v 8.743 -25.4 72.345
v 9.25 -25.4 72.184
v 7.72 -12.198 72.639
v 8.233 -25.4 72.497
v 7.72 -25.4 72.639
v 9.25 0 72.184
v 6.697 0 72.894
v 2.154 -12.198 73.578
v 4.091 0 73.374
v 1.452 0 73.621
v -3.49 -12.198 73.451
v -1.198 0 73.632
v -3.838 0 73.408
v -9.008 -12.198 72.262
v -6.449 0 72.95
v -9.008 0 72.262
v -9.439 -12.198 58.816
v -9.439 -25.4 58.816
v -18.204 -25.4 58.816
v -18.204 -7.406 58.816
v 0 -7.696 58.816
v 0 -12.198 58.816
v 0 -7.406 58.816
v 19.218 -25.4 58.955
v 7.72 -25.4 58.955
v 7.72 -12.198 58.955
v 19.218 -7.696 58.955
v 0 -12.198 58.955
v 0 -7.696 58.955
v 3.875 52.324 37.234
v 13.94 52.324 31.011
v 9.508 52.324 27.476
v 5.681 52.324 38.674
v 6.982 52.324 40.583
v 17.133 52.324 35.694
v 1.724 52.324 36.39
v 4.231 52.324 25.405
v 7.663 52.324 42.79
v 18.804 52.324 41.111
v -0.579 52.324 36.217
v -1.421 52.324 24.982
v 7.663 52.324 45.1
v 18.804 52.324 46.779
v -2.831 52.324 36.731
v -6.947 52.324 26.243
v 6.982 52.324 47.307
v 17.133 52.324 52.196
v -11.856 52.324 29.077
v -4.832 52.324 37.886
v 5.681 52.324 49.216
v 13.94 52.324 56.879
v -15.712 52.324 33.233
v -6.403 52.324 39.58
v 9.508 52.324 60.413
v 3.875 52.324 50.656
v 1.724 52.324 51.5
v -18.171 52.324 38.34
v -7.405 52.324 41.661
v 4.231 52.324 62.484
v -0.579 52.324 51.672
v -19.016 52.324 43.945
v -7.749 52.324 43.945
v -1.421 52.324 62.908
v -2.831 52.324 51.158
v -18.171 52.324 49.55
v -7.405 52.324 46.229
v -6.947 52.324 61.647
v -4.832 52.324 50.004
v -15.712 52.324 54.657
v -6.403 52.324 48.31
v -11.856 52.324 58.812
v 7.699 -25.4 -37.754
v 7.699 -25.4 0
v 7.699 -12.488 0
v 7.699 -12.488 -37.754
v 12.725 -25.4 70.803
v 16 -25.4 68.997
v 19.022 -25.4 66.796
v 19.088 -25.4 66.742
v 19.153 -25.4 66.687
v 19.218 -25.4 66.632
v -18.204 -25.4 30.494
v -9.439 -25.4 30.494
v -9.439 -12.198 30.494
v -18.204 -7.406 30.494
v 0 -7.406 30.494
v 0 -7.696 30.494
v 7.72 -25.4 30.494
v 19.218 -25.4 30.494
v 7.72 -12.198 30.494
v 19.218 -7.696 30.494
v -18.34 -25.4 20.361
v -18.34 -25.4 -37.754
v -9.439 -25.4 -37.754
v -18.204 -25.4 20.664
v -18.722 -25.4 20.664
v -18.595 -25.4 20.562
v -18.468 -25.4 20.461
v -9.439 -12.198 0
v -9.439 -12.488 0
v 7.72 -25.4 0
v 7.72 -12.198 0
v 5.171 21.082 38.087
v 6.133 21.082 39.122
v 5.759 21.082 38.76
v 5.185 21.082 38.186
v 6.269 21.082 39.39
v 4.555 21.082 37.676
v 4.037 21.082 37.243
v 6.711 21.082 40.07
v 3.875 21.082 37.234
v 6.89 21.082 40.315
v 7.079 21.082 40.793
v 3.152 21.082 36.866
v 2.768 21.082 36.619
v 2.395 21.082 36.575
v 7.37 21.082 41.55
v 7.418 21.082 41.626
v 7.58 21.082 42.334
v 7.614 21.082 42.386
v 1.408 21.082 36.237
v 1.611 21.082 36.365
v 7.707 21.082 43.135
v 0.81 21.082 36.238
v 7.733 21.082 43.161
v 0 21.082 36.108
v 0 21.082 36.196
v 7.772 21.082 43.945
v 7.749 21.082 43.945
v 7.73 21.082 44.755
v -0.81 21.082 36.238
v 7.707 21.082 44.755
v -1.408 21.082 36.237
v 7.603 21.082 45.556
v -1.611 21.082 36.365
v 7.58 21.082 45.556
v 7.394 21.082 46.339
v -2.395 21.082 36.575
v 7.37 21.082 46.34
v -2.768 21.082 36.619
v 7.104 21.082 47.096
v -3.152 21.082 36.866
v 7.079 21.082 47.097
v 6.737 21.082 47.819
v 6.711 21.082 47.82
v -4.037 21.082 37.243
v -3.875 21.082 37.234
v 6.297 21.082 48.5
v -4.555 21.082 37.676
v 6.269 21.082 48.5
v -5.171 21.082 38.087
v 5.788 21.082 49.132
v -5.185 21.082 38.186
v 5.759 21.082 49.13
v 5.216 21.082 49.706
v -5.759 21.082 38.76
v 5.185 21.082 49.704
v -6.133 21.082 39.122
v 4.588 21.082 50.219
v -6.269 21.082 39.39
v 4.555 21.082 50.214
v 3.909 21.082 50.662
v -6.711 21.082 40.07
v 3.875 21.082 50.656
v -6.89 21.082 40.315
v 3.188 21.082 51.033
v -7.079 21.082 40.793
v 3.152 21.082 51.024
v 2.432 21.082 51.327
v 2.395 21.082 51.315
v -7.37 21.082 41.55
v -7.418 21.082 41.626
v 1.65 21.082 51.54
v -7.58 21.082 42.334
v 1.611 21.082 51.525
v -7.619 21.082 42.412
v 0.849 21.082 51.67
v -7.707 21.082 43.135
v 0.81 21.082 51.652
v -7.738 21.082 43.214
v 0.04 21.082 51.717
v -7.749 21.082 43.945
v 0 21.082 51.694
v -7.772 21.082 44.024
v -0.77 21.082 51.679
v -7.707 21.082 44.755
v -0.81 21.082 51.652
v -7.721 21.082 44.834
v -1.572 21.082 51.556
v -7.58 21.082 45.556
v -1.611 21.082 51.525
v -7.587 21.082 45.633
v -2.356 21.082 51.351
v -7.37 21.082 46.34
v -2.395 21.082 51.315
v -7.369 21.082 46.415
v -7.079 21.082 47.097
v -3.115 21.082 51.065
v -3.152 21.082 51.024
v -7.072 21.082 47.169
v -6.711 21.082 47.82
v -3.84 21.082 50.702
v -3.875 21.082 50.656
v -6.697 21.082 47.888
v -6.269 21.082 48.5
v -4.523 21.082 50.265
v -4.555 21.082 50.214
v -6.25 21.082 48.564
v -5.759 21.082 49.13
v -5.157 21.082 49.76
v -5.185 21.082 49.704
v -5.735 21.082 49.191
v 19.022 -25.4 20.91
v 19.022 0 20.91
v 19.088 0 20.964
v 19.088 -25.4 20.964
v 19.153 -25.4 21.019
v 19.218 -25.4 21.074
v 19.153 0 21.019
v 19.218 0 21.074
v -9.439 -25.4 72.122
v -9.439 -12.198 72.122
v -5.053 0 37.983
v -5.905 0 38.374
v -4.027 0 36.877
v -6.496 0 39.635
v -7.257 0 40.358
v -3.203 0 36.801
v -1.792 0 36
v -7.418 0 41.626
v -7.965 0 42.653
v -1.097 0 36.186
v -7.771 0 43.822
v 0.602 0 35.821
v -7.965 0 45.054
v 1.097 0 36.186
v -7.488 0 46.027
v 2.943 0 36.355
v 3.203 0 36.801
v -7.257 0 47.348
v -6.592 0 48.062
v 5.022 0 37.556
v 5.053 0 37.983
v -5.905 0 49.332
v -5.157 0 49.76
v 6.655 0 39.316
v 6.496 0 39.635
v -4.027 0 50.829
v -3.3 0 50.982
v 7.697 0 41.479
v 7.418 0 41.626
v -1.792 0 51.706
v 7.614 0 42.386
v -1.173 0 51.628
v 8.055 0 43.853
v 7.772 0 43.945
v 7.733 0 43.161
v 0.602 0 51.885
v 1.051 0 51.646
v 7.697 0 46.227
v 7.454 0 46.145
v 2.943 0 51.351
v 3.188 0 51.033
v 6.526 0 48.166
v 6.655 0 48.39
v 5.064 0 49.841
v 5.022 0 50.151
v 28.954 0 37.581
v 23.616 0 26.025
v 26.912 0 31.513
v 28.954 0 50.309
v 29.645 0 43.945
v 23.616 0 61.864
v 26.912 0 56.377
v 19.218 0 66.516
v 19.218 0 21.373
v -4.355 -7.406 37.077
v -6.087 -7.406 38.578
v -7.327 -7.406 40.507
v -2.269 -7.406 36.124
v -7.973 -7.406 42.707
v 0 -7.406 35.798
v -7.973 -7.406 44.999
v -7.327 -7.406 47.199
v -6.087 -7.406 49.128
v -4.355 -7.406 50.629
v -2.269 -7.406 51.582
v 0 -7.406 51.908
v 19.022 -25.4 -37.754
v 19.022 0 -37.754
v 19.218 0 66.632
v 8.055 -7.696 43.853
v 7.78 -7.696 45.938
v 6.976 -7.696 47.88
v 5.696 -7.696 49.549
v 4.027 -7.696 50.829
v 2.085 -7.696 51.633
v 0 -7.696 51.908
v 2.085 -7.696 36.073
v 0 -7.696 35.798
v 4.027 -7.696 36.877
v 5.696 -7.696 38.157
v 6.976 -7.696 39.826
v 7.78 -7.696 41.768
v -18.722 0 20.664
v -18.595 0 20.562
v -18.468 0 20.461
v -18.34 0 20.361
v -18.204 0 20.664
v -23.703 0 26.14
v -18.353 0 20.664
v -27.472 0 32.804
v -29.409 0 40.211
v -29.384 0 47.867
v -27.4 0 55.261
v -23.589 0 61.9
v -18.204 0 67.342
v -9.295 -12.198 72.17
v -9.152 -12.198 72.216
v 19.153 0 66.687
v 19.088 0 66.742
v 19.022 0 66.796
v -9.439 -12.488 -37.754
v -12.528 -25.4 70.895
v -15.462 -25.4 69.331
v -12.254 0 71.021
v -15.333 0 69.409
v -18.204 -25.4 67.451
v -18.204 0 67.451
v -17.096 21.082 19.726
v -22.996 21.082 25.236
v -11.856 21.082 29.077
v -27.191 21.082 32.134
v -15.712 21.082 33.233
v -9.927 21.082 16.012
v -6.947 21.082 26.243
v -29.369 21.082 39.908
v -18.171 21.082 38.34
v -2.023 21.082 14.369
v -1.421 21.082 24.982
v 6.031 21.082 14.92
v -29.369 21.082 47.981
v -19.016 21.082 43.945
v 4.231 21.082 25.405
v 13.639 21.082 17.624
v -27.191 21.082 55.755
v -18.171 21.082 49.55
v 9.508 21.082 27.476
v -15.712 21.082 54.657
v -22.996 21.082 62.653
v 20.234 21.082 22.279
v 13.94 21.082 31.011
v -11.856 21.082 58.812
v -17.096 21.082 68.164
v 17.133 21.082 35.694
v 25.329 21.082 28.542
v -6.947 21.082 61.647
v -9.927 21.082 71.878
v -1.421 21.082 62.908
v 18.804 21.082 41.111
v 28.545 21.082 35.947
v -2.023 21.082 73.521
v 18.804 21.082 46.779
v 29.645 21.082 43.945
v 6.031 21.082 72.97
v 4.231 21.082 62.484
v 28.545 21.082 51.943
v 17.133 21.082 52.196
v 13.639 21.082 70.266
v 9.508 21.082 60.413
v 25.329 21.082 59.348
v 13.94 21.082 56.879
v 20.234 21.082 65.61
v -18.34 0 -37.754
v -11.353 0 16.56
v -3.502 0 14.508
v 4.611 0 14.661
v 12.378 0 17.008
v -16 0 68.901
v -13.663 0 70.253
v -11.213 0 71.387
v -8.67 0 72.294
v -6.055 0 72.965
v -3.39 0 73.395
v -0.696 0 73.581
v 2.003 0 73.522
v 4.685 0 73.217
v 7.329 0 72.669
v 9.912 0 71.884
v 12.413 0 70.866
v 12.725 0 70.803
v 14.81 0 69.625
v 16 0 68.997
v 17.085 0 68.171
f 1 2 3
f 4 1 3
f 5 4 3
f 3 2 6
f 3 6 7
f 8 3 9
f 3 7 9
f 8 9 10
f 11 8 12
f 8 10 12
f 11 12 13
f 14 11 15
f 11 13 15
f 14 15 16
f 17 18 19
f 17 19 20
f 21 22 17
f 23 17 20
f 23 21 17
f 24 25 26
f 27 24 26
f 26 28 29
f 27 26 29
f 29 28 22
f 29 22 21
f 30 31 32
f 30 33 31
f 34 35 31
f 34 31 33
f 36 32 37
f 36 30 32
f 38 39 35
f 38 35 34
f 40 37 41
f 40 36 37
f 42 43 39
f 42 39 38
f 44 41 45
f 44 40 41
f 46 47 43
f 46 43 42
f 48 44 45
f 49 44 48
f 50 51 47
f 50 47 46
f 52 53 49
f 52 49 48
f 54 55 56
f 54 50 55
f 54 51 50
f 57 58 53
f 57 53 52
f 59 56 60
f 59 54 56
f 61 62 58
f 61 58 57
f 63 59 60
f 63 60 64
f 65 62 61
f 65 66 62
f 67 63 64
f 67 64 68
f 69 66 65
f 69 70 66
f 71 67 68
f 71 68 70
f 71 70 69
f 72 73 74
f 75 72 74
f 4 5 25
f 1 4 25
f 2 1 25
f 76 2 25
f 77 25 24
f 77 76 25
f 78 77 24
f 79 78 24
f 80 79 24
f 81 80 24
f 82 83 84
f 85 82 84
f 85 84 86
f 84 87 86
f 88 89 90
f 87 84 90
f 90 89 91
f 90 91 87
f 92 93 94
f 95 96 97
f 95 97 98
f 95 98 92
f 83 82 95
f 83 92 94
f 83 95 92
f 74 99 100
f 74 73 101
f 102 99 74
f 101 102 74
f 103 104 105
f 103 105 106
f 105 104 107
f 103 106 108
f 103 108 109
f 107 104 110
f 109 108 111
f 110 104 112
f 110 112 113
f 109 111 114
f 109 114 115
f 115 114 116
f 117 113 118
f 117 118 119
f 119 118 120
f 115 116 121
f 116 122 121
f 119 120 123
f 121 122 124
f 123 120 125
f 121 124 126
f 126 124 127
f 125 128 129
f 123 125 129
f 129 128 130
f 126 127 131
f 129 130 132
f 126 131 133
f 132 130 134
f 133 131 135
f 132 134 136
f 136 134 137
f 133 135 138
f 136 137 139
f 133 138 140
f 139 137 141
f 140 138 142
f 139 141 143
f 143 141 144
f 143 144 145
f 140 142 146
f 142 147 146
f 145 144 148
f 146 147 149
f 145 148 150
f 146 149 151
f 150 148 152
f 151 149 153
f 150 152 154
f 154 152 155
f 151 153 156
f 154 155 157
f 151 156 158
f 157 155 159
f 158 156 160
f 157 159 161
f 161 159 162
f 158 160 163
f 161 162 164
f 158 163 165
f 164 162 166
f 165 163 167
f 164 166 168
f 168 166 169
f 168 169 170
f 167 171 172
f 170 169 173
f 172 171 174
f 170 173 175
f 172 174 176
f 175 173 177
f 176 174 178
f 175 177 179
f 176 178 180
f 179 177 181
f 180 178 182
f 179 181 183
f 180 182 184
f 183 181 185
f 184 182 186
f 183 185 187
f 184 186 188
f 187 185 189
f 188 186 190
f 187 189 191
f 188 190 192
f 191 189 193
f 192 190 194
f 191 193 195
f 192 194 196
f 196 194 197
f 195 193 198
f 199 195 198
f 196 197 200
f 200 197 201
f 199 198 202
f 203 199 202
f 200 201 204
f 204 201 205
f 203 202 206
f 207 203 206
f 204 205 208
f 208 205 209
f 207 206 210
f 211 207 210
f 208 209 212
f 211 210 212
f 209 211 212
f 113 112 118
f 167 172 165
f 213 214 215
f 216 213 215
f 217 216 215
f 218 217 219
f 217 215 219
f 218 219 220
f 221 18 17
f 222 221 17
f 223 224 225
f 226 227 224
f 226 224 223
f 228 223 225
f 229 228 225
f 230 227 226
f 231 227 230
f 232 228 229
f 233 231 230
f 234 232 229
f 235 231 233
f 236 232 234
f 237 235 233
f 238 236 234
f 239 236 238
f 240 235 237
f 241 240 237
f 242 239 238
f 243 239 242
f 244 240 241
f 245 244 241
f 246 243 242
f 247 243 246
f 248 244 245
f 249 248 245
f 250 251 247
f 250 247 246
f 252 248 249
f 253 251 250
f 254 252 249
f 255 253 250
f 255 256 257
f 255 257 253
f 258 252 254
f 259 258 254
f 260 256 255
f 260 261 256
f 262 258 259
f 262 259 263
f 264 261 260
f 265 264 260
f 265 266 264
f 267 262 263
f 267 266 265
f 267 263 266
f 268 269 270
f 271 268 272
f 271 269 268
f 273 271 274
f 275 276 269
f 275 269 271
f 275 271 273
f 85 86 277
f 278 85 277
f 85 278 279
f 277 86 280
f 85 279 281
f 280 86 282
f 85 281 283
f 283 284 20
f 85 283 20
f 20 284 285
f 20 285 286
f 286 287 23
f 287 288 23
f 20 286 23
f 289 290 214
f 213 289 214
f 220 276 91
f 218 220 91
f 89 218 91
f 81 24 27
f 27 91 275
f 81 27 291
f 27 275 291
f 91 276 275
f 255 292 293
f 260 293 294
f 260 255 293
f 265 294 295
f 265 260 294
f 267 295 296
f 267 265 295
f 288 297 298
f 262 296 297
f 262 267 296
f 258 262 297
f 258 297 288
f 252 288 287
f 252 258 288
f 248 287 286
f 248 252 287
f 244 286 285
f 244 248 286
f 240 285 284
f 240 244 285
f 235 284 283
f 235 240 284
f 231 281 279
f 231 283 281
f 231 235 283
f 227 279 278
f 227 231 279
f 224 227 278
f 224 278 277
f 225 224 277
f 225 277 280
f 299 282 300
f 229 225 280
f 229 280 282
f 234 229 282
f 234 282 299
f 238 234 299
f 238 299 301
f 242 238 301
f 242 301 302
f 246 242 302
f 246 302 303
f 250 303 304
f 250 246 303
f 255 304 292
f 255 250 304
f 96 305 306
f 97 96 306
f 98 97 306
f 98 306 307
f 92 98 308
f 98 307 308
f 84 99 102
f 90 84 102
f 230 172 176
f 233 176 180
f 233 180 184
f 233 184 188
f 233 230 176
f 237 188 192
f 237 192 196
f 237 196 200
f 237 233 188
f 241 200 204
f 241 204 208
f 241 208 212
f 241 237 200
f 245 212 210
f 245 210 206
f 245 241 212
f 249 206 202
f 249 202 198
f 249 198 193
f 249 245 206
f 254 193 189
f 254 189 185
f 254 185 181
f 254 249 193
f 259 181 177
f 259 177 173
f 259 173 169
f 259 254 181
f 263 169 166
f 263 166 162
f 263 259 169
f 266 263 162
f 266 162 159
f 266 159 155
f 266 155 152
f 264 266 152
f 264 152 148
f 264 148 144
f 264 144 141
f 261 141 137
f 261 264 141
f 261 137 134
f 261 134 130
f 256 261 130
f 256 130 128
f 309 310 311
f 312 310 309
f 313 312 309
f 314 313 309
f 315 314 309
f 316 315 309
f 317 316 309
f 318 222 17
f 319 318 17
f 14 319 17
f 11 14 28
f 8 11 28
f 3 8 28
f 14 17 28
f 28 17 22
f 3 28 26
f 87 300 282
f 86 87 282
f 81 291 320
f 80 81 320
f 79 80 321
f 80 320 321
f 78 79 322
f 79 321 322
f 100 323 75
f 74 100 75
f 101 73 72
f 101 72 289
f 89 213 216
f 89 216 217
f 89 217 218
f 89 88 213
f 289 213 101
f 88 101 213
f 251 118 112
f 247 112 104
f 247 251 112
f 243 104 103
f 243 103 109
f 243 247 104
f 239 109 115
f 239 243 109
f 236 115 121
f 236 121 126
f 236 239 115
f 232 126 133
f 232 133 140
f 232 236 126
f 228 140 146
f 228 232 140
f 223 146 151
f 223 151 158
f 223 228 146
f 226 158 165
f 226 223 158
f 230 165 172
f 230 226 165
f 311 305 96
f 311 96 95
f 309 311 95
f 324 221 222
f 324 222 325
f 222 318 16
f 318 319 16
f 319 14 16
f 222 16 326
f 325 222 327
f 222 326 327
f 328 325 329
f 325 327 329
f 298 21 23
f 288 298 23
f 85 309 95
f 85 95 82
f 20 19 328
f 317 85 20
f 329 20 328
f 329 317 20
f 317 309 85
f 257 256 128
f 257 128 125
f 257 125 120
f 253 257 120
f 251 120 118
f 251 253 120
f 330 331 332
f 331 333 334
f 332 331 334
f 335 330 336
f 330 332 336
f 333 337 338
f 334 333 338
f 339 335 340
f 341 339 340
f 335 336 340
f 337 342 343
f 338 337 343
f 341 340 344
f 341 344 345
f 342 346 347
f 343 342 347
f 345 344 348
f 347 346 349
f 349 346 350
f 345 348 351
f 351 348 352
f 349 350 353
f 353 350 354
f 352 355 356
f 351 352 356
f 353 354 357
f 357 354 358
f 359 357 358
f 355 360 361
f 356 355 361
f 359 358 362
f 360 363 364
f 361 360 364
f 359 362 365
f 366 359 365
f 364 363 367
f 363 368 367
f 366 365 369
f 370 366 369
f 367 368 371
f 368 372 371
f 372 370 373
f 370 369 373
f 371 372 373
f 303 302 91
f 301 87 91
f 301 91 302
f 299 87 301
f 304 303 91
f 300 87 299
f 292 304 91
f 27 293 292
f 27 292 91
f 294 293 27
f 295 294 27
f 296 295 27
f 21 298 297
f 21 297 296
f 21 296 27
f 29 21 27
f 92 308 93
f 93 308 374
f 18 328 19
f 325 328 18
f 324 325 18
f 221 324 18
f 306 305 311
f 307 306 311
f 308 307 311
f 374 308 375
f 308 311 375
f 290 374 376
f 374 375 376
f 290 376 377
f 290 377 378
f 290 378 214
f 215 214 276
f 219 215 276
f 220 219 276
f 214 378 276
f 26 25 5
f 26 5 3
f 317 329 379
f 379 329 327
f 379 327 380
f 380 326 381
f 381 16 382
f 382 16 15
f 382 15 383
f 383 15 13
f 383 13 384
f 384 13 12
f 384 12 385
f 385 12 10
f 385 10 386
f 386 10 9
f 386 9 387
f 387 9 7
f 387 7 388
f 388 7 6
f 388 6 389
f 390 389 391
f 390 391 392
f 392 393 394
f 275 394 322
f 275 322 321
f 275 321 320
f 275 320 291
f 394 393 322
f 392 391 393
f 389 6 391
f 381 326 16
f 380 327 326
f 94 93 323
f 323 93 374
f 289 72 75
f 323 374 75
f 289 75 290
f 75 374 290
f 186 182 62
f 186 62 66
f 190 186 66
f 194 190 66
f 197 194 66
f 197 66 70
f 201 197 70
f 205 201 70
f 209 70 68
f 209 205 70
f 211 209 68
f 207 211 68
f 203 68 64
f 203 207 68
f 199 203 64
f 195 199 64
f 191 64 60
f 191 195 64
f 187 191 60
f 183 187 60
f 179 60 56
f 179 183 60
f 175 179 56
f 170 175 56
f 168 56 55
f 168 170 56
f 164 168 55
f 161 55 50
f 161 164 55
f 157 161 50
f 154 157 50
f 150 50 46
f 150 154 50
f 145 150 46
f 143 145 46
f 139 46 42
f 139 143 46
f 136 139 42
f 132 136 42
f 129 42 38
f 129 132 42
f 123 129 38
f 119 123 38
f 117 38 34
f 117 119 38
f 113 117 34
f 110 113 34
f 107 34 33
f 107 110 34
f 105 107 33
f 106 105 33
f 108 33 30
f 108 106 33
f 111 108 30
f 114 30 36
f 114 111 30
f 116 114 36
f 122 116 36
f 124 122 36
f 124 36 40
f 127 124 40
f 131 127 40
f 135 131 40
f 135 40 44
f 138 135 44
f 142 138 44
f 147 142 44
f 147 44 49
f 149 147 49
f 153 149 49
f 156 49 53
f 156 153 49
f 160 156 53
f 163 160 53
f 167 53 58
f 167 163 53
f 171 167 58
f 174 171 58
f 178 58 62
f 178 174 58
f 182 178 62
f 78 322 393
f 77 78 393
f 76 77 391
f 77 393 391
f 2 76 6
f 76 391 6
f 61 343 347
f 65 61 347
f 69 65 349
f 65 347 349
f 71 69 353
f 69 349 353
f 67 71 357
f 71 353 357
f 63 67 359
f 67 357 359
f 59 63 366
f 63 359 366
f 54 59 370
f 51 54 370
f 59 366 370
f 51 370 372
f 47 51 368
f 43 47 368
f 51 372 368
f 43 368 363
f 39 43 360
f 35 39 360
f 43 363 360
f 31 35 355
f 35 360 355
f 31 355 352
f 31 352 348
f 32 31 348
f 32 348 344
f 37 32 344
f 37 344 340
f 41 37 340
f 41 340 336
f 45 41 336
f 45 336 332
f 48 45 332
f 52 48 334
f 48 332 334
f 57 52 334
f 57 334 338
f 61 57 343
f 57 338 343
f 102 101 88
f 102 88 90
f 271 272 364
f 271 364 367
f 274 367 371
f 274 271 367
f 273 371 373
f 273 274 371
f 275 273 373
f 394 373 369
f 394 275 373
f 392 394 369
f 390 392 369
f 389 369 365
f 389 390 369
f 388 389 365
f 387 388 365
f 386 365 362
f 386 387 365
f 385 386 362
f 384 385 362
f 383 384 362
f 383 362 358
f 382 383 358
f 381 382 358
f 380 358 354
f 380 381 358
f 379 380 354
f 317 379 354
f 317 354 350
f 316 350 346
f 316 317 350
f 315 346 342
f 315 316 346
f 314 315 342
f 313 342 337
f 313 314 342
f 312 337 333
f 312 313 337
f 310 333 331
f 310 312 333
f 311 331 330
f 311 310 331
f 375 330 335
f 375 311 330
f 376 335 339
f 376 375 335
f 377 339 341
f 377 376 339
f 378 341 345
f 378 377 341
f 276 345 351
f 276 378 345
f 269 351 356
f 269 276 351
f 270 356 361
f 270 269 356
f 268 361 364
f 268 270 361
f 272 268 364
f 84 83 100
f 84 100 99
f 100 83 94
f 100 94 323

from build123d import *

# Parameters (mm, degrees)
F0_R      = 15.433167194
F0_R_2    = 8.0548322191
F1_DEPTH  = 25.4
F2_W      = 17.1370897226
F2_H      = 13.9400362968
F3_DEPTH  = 52.07
F4_W      = 17.1583444834
F4_H      = 14.7807182949
F5_DEPTH  = 100.076
F7_W      = 20.3292299993
F7_H      = 28.4609068185
F8_DEPTH  = 57.658
F9_W      = 20.3302133896
F9_H      = 28.3219206433
F10_DEPTH = 54.61
F11_W     = 19.8471819321
F11_H     = 48.8284118474
F11_W_2   = 19.9860688299
F11_H_2   = 48.6484020948
F12_DEPTH = 44.704
F13_R     = 29.6448056137
F13_R_2   = 17.9422846096
F14_DEPTH = 21.082
F15_R     = 19.0161777789
F15_R_2   = 7.7492998165
F16_DEPTH = 31.242


with BuildPart() as f1:
    # F0 (on Front) → F1 (new body)
    with BuildSketch(Plane.XZ):
        Polygon((19.0223418176, 28.2409206692), (19.0223418176, 59.6059984693), (9.2501137406, 59.6059984693), (-9.0077609013, 59.6059984693), (-18.3395408094, 59.6059984693), (-18.3395408094, 28.2409206692), (-9.0077609013, 28.2409206692), (9.2501137406, 28.2409206692), align=None)
        with Locations((0.1452074648, 43.853033334)):
            Circle(F0_R, mode=Mode.SUBTRACT)
        with BuildLine():
            Line((9.2501137406, -37.7542672334), (9.2501137406, 15.5216934006))
            ThreePointArc((9.2501137406, 15.5216934006), (0.1272952852, 14.0501270571), (-9.0077609013, 15.4437096852))
            Line((-9.0077609013, 15.4437096852), (-9.0077609013, -37.7542672334))
            Line((-9.0077609013, -37.7542672334), (9.2501137406, -37.7542672334))
        make_face()
        with Locations((0.1452074648, 43.853033334)):
            Circle(F0_R)
        with Locations((0, 43.853033334)):
            Circle(F0_R_2, mode=Mode.SUBTRACT)
        with BuildLine():
            Line((19.0223418176, -37.7542672334), (19.0223418176, 20.9100618958))
            ThreePointArc((19.0223418176, 20.9100618958), (14.3906763073, 17.7544153235), (9.2501137406, 15.5216934006))
            Line((9.2501137406, 15.5216934006), (9.2501137406, -37.7542672334))
            Line((9.2501137406, -37.7542672334), (19.0223418176, -37.7542672334))
        make_face()
        with BuildLine():
            Line((-9.0077609013, -37.7542672334), (-9.0077609013, 15.4437096852))
            ThreePointArc((-9.0077609013, 15.4437096852), (-13.8929074263, 17.4860738983), (-18.3395408094, 20.360679907))
            Line((-18.3395408094, 20.360679907), (-18.3395408094, -37.7542672334))
            Line((-18.3395408094, -37.7542672334), (-9.0077609013, -37.7542672334))
        make_face()
        with BuildLine():
            Line((-18.3395408094, 59.6059984693), (-18.3395408094, 67.345386761))
            ThreePointArc((-18.3395408094, 67.345386761), (-29.8031781298, 43.853033334), (-18.3395408094, 20.360679907))
            Line((-18.3395408094, 20.360679907), (-18.3395408094, 28.2409206692))
            Line((-18.3395408094, 28.2409206692), (-18.3395408094, 59.6059984693))
        make_face()
        with BuildLine():
            ThreePointArc((19.0223418176, 20.9100618958), (26.973650738, 31.178192408), (29.8031781298, 43.853033334))
            ThreePointArc((29.8031781298, 43.853033334), (26.973650738, 56.5278742601), (19.0223418176, 66.7960047722))
            Line((19.0223418176, 66.7960047722), (19.0223418176, 59.6059984693))
            Line((19.0223418176, 59.6059984693), (19.0223418176, 28.2409206692))
            Line((19.0223418176, 28.2409206692), (19.0223418176, 20.9100618958))
        make_face()
        with BuildLine():
            ThreePointArc((-9.0077609013, 15.4437096852), (0.1272952852, 14.0501270571), (9.2501137406, 15.5216934006))
            Line((9.2501137406, 15.5216934006), (9.2501137406, 28.2409206692))
            Line((9.2501137406, 28.2409206692), (-9.0077609013, 28.2409206692))
            Line((-9.0077609013, 28.2409206692), (-9.0077609013, 15.4437096852))
        make_face()
        with BuildLine():
            Line((9.2501137406, 59.6059984693), (9.2501137406, 72.1843732675))
            ThreePointArc((9.2501137406, 72.1843732675), (0.1272952852, 73.6559396109), (-9.0077609013, 72.2623569828))
            Line((-9.0077609013, 72.2623569828), (-9.0077609013, 59.6059984693))
            Line((-9.0077609013, 59.6059984693), (9.2501137406, 59.6059984693))
        make_face()
        with BuildLine():
            ThreePointArc((9.2501137406, 15.5216934006), (14.3906763073, 17.7544153235), (19.0223418176, 20.9100618958))
            Line((19.0223418176, 20.9100618958), (19.0223418176, 28.2409206692))
            Line((19.0223418176, 28.2409206692), (9.2501137406, 28.2409206692))
            Line((9.2501137406, 28.2409206692), (9.2501137406, 15.5216934006))
        make_face()
        with BuildLine():
            Line((19.0223418176, 59.6059984693), (19.0223418176, 66.7960047722))
            ThreePointArc((19.0223418176, 66.7960047722), (14.3906763073, 69.9516513445), (9.2501137406, 72.1843732675))
            Line((9.2501137406, 72.1843732675), (9.2501137406, 59.6059984693))
            Line((9.2501137406, 59.6059984693), (19.0223418176, 59.6059984693))
        make_face()
        with BuildLine():
            ThreePointArc((-18.3395408094, 20.360679907), (-13.8929074263, 17.4860738983), (-9.0077609013, 15.4437096852))
            Line((-9.0077609013, 15.4437096852), (-9.0077609013, 28.2409206692))
            Line((-9.0077609013, 28.2409206692), (-18.3395408094, 28.2409206692))
            Line((-18.3395408094, 28.2409206692), (-18.3395408094, 20.360679907))
        make_face()
        with BuildLine():
            Line((-9.0077609013, 59.6059984693), (-9.0077609013, 72.2623569828))
            ThreePointArc((-9.0077609013, 72.2623569828), (-13.8929074263, 70.2199927697), (-18.3395408094, 67.345386761))
            Line((-18.3395408094, 67.345386761), (-18.3395408094, 59.6059984693))
            Line((-18.3395408094, 59.6059984693), (-9.0077609013, 59.6059984693))
        make_face()
    extrude(amount=F1_DEPTH)

    # F2 (on Top) → F3 (cut)
    with BuildSketch(Plane.XY):
        with Locations((-0.8700220022, -19.4579679519)):
            Rectangle(F2_W, F2_H)
    extrude(amount=-F3_DEPTH, mode=Mode.SUBTRACT)

    # F4 (on Top) → F5 (cut)
    with BuildSketch(Plane.XY):
        with Locations((-0.8593946218, -19.5878909072)):
            Rectangle(F4_W, F4_H)
    extrude(amount=F5_DEPTH, mode=Mode.SUBTRACT)

    # F7 (on Right) → F8 (cut)
    with BuildSketch(Plane.YZ):
        with Locations((-17.8606694099, 44.7242846712)):
            Rectangle(F7_W, F7_H)
    extrude(amount=F8_DEPTH, mode=Mode.SUBTRACT)

    # F9 (on Right) → F10 (cut)
    with BuildSketch(Plane.YZ):
        with Locations((-17.5707505118, 44.6547915836)):
            Rectangle(F9_W, F9_H)
    extrude(amount=-F10_DEPTH, mode=Mode.SUBTRACT)

    # F11 (on Front) → F12 (cut)
    with BuildSketch(Plane.XZ):
        with Locations((29.1418134246, 44.8984373361)):
            Rectangle(F11_W, F11_H)
        with Locations((-28.1968573108, 44.9884422123)):
            Rectangle(F11_W_2, F11_H_2)
    extrude(amount=F12_DEPTH, mode=Mode.SUBTRACT)

    # F13 (on face) → F14 (join)
    with BuildSketch(Plane.XZ):
        with Locations((0, 43.9448542893)):
            Circle(F13_R)
        with Locations((0, 43.9448542893)):
            Circle(F13_R_2, mode=Mode.SUBTRACT)
        with Locations((0, 43.9448542893)):
            Circle(F13_R_2)
        with BuildLine():
            ThreePointArc((-7.4182733413, 41.6264460763), (-1.1726275703, 51.6280008186), (7.772116572, 43.9448542893))
            ThreePointArc((7.772116572, 43.9448542893), (7.6831465293, 42.772226719), (7.4182733413, 41.6264460763))
            ThreePointArc((7.4182733413, 41.6264460763), (0, 36.1078109239), (-7.4182733413, 41.6264460763))
        make_face(mode=Mode.SUBTRACT)
    extrude(amount=-F14_DEPTH)

    # F15 (on face) → F16 (join)
    with BuildSketch(Plane(origin=(0, 21.082, 0), x_dir=(-1, 0, 0), z_dir=(0, 1, 0))):
        with Locations((0, 43.9448542893)):
            Circle(F15_R)
        with Locations((0, 43.9448542893)):
            Circle(F15_R_2, mode=Mode.SUBTRACT)
    extrude(amount=F16_DEPTH)


solid = f1.part
